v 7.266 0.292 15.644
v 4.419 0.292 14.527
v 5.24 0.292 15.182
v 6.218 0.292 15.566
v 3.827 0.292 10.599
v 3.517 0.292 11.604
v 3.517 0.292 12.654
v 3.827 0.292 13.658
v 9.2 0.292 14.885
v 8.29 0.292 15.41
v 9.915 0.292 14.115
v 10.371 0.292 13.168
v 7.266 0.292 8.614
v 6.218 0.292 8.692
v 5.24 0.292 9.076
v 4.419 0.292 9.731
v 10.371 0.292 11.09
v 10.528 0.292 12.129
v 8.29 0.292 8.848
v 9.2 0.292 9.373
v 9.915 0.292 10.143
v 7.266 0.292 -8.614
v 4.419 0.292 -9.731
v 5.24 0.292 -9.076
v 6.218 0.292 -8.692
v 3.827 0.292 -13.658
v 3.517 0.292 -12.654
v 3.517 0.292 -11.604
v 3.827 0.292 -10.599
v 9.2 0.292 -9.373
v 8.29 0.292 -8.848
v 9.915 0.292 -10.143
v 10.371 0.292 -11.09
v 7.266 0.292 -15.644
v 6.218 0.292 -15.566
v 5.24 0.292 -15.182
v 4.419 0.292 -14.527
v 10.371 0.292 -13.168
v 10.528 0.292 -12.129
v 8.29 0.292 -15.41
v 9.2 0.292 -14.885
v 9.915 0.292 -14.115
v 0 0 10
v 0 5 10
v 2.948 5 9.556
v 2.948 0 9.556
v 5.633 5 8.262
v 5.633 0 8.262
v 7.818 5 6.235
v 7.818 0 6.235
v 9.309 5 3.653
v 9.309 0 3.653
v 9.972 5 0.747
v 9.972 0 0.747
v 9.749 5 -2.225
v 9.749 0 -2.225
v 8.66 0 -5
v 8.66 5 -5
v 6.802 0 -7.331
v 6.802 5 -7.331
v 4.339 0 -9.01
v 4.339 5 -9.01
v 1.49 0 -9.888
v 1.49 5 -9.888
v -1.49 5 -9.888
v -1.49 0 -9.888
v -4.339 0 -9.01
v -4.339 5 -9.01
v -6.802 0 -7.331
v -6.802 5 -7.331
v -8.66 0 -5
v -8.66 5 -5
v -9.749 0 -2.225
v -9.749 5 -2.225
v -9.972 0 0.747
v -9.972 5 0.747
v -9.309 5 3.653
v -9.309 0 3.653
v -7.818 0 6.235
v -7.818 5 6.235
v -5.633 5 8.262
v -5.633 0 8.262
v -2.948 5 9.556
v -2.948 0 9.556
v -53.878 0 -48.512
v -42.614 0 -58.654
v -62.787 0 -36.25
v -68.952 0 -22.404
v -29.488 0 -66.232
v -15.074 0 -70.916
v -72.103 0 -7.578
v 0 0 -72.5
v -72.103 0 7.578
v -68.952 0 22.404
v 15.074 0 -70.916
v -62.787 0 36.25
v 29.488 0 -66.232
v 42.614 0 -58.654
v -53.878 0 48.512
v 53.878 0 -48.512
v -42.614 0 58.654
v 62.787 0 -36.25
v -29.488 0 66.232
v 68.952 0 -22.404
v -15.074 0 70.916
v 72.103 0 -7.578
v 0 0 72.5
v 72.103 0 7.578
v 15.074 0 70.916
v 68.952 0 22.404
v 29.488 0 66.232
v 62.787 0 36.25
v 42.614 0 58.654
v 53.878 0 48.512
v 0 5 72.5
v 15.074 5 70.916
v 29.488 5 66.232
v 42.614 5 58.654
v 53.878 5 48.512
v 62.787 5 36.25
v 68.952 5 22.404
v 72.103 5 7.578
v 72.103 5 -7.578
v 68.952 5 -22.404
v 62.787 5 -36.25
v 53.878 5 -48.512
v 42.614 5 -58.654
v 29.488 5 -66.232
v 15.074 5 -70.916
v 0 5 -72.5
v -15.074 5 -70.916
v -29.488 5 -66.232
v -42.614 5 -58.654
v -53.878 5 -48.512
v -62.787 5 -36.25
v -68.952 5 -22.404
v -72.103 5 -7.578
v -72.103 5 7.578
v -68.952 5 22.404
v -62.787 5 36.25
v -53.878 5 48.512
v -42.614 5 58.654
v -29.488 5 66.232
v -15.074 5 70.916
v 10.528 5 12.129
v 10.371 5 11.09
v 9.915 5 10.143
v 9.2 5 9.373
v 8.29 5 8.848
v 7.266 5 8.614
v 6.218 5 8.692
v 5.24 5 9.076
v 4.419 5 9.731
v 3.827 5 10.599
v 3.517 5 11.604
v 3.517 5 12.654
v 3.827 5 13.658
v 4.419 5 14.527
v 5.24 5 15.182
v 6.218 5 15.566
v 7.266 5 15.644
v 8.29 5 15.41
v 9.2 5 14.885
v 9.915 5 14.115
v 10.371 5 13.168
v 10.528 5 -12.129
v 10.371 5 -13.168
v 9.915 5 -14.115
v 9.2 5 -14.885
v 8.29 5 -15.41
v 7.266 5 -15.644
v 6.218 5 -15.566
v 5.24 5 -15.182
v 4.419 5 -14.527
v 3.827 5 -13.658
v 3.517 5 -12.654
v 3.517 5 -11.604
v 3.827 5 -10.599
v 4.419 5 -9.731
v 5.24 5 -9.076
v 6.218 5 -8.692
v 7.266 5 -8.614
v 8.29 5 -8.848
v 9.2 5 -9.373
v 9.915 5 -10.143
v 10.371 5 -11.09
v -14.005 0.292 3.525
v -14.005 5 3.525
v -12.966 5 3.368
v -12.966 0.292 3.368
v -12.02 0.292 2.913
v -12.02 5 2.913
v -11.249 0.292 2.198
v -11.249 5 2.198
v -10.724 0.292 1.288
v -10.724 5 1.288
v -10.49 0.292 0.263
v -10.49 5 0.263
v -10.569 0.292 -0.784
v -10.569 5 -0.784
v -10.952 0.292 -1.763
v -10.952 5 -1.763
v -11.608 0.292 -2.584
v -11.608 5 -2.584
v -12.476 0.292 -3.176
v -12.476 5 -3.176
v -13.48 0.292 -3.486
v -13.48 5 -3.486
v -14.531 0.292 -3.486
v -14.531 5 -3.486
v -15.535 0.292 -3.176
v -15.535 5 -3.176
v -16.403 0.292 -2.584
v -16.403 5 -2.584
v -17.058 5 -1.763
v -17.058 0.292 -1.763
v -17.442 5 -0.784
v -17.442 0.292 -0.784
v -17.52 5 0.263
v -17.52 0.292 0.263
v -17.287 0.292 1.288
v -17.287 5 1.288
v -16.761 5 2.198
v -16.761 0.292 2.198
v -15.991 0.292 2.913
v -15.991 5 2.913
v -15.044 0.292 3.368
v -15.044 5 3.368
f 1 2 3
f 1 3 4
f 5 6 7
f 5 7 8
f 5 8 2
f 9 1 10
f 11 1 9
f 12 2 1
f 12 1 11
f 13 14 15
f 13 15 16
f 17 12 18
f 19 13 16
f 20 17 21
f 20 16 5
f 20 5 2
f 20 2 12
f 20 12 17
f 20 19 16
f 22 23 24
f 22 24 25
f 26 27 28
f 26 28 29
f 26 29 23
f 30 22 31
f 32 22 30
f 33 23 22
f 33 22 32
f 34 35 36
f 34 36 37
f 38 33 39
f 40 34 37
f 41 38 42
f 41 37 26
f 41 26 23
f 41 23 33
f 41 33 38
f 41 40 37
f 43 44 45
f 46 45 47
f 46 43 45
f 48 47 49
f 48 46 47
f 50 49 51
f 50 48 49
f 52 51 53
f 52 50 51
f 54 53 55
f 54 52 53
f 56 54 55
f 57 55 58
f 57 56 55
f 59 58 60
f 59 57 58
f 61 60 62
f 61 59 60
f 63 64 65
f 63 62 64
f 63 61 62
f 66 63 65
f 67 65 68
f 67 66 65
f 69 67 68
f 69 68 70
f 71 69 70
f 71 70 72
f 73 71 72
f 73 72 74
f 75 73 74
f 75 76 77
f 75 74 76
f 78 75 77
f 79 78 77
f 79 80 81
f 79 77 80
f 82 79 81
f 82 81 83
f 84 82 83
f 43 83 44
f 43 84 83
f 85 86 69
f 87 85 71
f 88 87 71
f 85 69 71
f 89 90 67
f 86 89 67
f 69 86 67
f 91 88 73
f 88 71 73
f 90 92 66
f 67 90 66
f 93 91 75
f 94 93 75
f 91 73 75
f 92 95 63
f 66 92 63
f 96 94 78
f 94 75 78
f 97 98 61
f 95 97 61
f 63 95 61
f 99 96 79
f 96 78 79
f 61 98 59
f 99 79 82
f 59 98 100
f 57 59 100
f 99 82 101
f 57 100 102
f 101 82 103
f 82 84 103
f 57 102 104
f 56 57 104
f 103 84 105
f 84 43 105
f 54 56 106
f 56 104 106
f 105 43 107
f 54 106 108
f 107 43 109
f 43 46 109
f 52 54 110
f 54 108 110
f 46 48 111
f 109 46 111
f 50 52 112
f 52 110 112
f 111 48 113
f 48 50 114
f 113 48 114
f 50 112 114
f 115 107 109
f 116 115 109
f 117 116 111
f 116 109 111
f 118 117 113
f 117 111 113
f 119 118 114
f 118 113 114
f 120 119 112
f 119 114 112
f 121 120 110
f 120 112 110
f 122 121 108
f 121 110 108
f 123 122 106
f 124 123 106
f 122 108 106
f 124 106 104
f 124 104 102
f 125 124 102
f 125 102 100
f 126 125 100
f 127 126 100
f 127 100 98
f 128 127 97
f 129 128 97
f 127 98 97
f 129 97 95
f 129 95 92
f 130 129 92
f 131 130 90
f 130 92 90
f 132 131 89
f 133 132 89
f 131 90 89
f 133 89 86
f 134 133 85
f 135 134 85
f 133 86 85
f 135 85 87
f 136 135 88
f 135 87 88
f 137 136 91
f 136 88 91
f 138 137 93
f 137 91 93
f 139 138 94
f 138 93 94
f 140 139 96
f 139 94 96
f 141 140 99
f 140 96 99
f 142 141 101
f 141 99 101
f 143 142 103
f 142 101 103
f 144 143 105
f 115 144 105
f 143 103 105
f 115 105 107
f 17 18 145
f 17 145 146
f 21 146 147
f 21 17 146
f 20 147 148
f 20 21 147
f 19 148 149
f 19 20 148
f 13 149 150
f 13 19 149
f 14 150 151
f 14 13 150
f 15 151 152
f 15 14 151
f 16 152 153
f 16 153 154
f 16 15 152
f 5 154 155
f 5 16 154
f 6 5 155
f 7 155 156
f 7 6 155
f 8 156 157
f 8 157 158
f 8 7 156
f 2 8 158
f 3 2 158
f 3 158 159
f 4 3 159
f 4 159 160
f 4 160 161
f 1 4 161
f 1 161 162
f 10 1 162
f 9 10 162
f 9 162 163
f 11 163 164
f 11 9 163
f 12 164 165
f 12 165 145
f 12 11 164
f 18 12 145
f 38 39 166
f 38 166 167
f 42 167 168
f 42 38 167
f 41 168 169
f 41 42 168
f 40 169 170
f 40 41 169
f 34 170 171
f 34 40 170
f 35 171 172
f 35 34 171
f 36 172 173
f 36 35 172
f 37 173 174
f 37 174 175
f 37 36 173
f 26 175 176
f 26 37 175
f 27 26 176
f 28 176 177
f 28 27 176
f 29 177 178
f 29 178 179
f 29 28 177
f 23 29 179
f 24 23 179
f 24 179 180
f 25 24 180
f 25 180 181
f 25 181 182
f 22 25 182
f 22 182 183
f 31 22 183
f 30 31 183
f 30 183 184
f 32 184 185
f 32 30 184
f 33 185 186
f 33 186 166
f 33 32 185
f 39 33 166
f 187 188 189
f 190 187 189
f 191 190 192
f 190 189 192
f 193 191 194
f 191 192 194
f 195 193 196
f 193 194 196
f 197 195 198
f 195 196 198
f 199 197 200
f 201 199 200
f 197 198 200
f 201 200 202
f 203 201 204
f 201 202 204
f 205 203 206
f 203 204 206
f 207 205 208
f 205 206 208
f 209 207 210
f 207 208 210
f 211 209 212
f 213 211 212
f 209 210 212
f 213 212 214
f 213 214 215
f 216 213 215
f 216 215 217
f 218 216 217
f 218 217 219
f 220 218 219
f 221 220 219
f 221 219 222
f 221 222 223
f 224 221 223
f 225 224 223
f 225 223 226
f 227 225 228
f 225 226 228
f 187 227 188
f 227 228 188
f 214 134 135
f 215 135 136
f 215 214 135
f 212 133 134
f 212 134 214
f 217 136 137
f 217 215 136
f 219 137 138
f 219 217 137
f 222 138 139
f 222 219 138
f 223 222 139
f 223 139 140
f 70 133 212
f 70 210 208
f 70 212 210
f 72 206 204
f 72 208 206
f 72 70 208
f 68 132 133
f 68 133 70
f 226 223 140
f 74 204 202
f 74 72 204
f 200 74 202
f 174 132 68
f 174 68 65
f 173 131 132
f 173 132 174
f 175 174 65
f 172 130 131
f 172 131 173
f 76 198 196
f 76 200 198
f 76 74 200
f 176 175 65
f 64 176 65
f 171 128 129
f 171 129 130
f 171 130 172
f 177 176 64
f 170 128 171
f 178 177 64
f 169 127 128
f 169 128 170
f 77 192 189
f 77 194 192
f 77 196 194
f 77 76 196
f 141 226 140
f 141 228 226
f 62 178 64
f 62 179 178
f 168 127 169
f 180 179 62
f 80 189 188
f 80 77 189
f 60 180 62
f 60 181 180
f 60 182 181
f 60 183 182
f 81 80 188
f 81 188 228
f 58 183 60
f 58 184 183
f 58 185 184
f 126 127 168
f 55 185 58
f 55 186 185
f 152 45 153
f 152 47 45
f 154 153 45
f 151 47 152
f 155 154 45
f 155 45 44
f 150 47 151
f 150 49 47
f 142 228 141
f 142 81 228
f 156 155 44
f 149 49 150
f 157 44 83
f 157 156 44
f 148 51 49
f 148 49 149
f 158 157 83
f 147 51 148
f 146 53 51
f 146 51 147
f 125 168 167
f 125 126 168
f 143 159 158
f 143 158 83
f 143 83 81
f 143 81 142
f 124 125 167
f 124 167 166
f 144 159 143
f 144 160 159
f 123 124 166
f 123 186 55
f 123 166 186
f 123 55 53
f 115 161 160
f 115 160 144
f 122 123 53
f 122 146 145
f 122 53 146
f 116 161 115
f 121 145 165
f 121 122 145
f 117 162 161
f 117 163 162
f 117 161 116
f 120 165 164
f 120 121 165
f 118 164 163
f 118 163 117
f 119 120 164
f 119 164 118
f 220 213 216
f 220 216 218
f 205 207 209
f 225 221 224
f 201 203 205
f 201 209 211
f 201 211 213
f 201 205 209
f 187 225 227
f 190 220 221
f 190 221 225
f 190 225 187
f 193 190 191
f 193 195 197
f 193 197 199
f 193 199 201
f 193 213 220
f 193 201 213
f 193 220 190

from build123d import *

# Parameters (mm, degrees)
SKETCH1_R           = 72.5
BOSS_EXTRUDE1_DEPTH = 5
SKETCH2_R           = 10
CUT_EXTRUDE1_DEPTH  = 103.652325838
SKETCH3_R           = 3.525017378
CUT_EXTRUDE2_DEPTH  = 4.708016116
CIRPATTERN1_COUNT   = 3


with BuildPart() as part:
    # Sketch1 → Boss-Extrude1 (new body)
    with BuildSketch(Plane(origin=(0, 0, 0), x_dir=(1, 0, 0), z_dir=(0, 1, 0))):
        Circle(SKETCH1_R)
    extrude(amount=BOSS_EXTRUDE1_DEPTH)

    # Sketch2 → Cut-Extrude1 (cut, through all)
    with BuildSketch(Plane(origin=(0, 0, 0), x_dir=(1, 0, 0), z_dir=(0, 1, 0))):
        Circle(SKETCH2_R)
    extrude(amount=CUT_EXTRUDE1_DEPTH, mode=Mode.SUBTRACT)

    # Sketch3 → Cut-Extrude2 (cut)
    with BuildSketch(Plane(origin=(0, 5, 0), x_dir=(1, 0, 0), z_dir=(0, 1, 0))):
        with Locations((-14.005246001, 0)):
            Circle(SKETCH3_R)
    cut_extrude2 = extrude(amount=-CUT_EXTRUDE2_DEPTH, mode=Mode.SUBTRACT)

    # CirPattern1: Cut-Extrude2 ×3 about axis
    cirpattern1_axis = Axis((0, 0, 0), (0, 1, 0))
    for i in range(1, CIRPATTERN1_COUNT):
        add(cut_extrude2.rotate(cirpattern1_axis, i * 360 / CIRPATTERN1_COUNT), mode=Mode.SUBTRACT)


solid = part.part
